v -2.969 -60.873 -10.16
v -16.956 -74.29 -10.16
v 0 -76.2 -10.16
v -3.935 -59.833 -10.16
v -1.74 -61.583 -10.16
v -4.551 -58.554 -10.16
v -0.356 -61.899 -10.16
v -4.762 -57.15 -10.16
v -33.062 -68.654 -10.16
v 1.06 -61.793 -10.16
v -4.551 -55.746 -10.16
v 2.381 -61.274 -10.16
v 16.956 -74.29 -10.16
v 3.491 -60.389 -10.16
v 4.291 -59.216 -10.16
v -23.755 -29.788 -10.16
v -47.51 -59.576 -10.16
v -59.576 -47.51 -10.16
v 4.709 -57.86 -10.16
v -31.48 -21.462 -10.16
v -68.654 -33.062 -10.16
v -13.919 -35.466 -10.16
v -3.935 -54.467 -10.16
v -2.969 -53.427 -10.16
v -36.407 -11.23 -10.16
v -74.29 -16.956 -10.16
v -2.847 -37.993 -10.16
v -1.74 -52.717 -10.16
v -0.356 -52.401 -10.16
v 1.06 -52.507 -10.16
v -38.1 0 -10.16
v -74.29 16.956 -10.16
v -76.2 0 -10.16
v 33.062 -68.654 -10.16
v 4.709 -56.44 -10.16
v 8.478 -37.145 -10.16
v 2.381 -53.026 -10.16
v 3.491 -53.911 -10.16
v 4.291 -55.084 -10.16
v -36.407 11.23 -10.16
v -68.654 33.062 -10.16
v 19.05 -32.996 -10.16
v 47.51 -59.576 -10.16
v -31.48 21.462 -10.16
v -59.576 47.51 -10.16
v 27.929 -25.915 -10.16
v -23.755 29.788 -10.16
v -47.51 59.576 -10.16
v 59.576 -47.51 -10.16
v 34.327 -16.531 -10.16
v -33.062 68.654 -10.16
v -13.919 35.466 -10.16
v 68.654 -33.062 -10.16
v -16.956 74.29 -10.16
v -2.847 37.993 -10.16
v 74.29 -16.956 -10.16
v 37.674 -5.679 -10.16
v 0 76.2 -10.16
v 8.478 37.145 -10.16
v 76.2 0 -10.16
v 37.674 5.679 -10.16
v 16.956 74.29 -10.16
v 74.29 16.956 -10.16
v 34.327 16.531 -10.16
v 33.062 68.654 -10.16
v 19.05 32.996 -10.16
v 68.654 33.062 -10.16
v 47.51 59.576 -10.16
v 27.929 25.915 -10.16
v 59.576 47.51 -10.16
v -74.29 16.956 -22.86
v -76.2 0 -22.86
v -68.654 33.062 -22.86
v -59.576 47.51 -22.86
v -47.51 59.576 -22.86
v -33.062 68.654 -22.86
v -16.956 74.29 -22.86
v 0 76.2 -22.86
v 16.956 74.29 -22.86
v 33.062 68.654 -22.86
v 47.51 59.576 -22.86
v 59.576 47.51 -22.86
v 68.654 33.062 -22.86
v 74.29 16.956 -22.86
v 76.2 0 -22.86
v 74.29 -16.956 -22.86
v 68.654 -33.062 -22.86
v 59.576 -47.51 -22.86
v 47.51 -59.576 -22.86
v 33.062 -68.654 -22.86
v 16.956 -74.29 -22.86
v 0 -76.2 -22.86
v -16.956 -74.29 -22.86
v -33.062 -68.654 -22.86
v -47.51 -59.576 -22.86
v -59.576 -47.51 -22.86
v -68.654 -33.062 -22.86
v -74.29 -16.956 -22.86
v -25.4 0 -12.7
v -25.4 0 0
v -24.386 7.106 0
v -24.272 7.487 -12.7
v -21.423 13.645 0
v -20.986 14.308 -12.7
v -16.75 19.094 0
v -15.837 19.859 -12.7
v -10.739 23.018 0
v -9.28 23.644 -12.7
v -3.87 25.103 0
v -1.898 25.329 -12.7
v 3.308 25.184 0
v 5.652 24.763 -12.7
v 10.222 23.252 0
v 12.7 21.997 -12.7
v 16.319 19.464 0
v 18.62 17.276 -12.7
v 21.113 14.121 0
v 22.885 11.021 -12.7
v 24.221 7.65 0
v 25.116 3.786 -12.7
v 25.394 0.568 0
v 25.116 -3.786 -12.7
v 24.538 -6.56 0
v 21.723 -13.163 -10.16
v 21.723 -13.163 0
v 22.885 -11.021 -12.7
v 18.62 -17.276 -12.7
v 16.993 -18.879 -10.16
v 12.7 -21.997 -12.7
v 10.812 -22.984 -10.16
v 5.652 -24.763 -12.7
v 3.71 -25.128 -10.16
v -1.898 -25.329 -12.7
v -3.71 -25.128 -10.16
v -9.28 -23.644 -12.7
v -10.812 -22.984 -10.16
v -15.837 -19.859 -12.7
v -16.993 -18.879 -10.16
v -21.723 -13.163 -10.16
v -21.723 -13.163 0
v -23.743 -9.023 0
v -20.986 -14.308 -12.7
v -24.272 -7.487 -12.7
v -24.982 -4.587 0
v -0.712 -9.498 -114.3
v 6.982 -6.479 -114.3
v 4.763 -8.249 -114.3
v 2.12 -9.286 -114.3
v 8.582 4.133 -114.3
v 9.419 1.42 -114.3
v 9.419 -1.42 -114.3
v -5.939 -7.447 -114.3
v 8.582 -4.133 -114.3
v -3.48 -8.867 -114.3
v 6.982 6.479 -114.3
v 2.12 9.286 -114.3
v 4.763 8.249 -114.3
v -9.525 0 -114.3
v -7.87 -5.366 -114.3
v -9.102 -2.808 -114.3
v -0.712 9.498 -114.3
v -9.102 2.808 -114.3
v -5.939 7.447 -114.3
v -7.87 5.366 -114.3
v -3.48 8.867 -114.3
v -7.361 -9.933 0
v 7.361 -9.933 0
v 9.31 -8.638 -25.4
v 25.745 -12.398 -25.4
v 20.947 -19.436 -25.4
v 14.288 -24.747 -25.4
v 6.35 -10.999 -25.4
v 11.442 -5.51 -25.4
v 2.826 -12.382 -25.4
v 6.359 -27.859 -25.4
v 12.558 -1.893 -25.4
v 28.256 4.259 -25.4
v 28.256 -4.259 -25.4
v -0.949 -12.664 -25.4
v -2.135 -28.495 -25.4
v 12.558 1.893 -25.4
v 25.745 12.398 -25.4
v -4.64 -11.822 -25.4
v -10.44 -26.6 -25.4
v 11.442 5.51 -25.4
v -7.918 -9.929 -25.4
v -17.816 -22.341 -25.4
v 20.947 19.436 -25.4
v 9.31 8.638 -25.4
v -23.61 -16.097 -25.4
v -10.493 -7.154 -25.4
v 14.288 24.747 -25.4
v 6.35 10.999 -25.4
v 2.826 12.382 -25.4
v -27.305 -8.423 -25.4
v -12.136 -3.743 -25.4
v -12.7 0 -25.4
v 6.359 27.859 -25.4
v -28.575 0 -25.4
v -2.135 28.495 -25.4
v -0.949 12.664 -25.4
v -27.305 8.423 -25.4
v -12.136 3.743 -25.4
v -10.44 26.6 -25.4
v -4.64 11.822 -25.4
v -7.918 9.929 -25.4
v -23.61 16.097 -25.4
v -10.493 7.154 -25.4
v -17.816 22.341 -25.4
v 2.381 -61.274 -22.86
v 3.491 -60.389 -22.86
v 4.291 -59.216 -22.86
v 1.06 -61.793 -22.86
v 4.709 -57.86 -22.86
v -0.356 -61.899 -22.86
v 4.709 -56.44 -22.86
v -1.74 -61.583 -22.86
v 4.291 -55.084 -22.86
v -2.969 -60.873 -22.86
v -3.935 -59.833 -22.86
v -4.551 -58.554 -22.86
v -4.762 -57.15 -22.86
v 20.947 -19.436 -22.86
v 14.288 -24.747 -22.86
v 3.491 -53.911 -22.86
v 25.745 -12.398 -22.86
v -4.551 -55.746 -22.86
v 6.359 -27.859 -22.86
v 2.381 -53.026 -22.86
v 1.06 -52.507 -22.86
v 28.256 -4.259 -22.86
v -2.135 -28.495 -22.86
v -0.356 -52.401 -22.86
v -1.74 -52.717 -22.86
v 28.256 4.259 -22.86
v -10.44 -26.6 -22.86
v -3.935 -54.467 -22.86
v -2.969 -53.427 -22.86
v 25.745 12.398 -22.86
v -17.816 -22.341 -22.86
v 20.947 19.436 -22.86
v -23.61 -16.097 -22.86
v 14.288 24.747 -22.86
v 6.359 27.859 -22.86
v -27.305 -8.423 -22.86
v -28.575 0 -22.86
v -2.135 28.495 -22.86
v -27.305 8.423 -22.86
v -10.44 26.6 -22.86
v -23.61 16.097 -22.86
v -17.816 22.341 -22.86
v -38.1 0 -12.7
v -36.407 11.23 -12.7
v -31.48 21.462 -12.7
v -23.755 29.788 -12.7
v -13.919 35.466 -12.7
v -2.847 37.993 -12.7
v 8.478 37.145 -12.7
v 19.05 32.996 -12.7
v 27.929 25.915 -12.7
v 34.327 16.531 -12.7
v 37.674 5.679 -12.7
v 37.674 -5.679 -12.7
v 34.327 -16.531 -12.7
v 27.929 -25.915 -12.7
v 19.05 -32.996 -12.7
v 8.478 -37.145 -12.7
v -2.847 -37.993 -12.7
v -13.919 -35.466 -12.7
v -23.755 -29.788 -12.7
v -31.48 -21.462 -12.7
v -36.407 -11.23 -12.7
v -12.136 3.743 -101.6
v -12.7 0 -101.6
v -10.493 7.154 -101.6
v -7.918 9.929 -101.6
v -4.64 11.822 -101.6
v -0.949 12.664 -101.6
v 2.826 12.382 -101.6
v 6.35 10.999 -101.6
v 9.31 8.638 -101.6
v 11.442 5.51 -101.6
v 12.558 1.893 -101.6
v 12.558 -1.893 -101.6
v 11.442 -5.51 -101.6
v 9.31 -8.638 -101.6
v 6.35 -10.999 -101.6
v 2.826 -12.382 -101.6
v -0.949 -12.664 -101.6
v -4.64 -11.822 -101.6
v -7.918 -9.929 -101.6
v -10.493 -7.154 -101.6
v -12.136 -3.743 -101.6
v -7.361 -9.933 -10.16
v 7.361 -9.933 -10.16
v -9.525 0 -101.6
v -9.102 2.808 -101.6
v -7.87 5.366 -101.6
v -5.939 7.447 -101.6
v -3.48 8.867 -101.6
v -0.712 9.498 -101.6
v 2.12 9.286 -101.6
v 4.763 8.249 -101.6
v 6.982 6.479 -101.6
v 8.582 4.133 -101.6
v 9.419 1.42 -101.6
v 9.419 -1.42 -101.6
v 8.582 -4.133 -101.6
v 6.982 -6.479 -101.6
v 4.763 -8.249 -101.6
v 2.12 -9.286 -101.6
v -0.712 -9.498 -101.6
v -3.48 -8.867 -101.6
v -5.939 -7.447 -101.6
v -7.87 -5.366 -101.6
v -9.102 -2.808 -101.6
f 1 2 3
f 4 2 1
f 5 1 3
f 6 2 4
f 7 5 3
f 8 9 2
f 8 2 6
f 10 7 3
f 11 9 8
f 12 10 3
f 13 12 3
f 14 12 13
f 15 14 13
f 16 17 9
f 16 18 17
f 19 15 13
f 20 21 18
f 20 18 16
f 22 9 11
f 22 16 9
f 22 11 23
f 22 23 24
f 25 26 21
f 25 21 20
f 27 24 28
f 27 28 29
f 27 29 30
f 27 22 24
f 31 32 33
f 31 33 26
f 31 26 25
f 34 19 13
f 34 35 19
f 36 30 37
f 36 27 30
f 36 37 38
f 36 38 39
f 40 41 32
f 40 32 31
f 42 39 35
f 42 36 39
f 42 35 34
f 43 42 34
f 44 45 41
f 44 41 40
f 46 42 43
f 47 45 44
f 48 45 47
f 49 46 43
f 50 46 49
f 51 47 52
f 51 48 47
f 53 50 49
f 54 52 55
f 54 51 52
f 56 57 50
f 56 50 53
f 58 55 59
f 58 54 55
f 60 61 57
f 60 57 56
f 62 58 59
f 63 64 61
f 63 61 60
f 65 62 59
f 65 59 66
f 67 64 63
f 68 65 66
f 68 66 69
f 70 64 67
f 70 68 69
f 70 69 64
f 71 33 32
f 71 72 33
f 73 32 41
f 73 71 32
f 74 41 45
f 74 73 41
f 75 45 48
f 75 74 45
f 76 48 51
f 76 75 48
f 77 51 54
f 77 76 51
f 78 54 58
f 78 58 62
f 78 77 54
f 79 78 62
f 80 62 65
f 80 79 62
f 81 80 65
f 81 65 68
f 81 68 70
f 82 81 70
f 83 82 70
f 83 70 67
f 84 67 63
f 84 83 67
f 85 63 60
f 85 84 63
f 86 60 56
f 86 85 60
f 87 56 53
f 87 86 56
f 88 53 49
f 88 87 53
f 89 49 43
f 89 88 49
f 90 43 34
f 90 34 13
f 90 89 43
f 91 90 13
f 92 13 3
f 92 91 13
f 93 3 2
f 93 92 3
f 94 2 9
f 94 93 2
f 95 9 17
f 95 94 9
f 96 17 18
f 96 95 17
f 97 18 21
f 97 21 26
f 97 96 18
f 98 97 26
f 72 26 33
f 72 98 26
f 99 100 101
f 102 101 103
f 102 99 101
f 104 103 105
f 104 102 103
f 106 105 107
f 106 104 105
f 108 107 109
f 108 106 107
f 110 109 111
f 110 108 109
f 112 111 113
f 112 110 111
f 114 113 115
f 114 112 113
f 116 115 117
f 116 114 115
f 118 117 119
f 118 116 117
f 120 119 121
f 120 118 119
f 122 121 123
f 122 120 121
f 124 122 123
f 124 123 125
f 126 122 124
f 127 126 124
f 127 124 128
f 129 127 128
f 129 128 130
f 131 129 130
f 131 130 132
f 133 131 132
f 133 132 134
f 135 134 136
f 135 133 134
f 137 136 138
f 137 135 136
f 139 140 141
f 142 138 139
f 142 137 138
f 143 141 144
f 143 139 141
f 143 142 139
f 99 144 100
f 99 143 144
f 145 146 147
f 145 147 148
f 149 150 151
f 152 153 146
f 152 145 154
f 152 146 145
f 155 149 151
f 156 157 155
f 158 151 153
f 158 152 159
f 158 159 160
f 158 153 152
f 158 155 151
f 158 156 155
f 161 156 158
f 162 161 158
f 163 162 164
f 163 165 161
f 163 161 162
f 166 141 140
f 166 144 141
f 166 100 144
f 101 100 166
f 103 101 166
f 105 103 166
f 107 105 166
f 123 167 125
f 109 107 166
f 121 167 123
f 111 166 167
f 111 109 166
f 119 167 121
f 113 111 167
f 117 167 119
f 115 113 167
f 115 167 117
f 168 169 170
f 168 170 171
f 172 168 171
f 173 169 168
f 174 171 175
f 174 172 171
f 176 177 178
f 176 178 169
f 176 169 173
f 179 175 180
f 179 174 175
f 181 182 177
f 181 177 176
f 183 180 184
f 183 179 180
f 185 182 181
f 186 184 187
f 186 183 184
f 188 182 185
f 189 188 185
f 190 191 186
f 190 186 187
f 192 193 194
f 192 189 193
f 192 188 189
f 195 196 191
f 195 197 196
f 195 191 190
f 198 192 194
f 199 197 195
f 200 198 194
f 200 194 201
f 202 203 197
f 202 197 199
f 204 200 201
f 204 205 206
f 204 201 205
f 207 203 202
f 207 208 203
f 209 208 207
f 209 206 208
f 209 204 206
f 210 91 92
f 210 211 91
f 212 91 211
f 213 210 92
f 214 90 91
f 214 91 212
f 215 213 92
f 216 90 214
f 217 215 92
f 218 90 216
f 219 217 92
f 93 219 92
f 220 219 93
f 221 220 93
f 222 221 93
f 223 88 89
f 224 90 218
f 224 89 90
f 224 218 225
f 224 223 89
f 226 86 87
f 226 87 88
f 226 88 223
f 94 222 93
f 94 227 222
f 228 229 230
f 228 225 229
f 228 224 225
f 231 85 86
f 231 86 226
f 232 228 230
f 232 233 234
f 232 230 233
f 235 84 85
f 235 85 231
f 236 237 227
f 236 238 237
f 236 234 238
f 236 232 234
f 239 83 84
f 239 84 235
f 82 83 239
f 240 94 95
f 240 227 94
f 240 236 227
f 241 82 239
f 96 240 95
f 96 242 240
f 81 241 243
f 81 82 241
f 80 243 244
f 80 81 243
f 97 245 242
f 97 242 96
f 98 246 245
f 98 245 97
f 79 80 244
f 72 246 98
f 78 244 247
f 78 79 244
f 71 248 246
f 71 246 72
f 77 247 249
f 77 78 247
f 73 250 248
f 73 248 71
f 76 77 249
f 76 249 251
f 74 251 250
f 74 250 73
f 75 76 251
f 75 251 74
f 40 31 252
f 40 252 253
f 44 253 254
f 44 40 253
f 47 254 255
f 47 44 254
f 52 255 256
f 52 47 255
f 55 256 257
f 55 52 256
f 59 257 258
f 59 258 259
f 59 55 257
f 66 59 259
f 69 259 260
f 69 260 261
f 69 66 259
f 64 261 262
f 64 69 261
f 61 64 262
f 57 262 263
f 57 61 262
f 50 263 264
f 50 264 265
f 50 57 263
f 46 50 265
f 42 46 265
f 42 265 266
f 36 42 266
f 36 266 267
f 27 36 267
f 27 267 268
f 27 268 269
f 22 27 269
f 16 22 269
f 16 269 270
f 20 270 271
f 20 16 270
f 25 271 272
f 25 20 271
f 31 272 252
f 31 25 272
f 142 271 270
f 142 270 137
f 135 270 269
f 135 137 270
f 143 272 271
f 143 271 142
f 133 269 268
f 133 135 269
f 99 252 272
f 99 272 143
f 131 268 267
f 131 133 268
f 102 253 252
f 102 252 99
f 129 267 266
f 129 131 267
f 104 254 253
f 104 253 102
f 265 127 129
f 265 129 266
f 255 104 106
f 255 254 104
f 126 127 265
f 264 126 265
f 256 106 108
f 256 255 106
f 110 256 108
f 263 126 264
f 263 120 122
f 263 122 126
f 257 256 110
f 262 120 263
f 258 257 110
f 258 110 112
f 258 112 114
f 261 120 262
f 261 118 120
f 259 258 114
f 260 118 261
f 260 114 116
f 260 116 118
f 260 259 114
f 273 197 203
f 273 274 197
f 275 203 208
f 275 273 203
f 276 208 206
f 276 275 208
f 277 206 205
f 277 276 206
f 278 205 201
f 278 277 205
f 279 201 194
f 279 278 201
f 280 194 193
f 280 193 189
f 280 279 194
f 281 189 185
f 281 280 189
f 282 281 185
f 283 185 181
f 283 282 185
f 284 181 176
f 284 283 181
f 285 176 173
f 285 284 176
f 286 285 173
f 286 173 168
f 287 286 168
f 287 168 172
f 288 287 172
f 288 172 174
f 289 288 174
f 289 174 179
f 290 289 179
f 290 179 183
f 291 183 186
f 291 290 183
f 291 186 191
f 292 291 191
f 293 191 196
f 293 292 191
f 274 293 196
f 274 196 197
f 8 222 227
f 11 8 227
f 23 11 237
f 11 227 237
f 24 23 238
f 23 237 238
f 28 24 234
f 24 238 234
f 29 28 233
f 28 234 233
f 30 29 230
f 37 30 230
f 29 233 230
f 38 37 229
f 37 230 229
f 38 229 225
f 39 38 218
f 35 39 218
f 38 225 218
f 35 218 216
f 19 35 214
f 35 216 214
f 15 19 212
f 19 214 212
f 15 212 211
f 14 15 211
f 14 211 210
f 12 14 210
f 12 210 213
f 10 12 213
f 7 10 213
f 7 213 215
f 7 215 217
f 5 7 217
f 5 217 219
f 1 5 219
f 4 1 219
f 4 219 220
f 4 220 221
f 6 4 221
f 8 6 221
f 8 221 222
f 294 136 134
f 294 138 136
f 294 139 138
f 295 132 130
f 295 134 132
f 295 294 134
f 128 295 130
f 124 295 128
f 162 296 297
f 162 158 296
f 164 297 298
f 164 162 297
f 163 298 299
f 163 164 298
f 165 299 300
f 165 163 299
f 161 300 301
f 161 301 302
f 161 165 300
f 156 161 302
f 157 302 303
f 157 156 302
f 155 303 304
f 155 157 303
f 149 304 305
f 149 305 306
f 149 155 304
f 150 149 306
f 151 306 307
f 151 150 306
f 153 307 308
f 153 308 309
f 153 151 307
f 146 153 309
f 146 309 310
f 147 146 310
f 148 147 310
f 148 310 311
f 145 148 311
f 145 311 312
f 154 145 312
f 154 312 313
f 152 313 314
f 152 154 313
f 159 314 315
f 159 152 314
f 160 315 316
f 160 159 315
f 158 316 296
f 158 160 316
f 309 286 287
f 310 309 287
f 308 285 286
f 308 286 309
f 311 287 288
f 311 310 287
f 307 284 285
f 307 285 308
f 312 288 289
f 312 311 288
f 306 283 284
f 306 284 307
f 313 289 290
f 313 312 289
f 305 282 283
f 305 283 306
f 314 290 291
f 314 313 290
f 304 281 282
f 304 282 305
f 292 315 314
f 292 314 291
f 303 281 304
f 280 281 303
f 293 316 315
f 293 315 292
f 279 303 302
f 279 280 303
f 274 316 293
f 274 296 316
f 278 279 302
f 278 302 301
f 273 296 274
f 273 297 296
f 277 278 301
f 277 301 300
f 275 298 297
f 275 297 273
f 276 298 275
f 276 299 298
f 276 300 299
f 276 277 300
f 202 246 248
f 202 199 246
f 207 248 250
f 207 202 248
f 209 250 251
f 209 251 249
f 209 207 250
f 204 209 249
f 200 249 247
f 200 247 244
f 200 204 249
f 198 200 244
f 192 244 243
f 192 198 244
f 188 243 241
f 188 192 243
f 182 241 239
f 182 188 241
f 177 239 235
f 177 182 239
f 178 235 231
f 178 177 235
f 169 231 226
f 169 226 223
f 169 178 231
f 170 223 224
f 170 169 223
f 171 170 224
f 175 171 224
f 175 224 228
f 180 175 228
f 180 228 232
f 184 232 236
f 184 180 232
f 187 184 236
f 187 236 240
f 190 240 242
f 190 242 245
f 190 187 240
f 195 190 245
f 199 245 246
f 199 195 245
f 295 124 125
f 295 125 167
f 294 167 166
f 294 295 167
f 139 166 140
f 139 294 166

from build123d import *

# Parameters (mm, degrees)
F3_DEPTH = 25.4
F5_D     = 9.525


# Not quite as in the source:
# - a length typed as a fraction of an inch, garbled in the dataset ("3 / 203.2 mm" for 3/8 in), is restored


with BuildPart() as f1:
    # F0 (on Front) → F1 (revolve)
    with BuildSketch(Plane.XZ):
        Polygon((0, -114.3), (0, 0), (-25.4, 0), (-25.4, -12.7), (-38.1, -12.7), (-38.1, -10.16), (-76.2, -10.16), (-76.2, -22.86), (-28.575, -22.86), (-28.575, -25.4), (-12.7, -25.4), (-12.7, -101.6), (-9.525, -101.6), (-9.525, -114.3), align=None)
    revolve(axis=Axis((0, 0, -53.3123221248), (0, 0, -1)))

    # F2 (on face) → F3 (cut)
    with BuildSketch(Plane.XY.offset(-10.16)):
        with BuildLine():
            ThreePointArc((-33.332184286, -18.4546875), (0, -38.1), (33.332184286, -18.4546875))
            ThreePointArc((33.332184286, -18.4546875), (0, -9.525), (-33.332184286, -18.4546875))
        make_face()
    extrude(amount=F3_DEPTH, mode=Mode.SUBTRACT)

    # F5 (through all)
    with Locations(Plane.XY.offset(-10.16)):
        with Locations((0, -57.15)):
            Hole(F5_D / 2)


solid = f1.part
